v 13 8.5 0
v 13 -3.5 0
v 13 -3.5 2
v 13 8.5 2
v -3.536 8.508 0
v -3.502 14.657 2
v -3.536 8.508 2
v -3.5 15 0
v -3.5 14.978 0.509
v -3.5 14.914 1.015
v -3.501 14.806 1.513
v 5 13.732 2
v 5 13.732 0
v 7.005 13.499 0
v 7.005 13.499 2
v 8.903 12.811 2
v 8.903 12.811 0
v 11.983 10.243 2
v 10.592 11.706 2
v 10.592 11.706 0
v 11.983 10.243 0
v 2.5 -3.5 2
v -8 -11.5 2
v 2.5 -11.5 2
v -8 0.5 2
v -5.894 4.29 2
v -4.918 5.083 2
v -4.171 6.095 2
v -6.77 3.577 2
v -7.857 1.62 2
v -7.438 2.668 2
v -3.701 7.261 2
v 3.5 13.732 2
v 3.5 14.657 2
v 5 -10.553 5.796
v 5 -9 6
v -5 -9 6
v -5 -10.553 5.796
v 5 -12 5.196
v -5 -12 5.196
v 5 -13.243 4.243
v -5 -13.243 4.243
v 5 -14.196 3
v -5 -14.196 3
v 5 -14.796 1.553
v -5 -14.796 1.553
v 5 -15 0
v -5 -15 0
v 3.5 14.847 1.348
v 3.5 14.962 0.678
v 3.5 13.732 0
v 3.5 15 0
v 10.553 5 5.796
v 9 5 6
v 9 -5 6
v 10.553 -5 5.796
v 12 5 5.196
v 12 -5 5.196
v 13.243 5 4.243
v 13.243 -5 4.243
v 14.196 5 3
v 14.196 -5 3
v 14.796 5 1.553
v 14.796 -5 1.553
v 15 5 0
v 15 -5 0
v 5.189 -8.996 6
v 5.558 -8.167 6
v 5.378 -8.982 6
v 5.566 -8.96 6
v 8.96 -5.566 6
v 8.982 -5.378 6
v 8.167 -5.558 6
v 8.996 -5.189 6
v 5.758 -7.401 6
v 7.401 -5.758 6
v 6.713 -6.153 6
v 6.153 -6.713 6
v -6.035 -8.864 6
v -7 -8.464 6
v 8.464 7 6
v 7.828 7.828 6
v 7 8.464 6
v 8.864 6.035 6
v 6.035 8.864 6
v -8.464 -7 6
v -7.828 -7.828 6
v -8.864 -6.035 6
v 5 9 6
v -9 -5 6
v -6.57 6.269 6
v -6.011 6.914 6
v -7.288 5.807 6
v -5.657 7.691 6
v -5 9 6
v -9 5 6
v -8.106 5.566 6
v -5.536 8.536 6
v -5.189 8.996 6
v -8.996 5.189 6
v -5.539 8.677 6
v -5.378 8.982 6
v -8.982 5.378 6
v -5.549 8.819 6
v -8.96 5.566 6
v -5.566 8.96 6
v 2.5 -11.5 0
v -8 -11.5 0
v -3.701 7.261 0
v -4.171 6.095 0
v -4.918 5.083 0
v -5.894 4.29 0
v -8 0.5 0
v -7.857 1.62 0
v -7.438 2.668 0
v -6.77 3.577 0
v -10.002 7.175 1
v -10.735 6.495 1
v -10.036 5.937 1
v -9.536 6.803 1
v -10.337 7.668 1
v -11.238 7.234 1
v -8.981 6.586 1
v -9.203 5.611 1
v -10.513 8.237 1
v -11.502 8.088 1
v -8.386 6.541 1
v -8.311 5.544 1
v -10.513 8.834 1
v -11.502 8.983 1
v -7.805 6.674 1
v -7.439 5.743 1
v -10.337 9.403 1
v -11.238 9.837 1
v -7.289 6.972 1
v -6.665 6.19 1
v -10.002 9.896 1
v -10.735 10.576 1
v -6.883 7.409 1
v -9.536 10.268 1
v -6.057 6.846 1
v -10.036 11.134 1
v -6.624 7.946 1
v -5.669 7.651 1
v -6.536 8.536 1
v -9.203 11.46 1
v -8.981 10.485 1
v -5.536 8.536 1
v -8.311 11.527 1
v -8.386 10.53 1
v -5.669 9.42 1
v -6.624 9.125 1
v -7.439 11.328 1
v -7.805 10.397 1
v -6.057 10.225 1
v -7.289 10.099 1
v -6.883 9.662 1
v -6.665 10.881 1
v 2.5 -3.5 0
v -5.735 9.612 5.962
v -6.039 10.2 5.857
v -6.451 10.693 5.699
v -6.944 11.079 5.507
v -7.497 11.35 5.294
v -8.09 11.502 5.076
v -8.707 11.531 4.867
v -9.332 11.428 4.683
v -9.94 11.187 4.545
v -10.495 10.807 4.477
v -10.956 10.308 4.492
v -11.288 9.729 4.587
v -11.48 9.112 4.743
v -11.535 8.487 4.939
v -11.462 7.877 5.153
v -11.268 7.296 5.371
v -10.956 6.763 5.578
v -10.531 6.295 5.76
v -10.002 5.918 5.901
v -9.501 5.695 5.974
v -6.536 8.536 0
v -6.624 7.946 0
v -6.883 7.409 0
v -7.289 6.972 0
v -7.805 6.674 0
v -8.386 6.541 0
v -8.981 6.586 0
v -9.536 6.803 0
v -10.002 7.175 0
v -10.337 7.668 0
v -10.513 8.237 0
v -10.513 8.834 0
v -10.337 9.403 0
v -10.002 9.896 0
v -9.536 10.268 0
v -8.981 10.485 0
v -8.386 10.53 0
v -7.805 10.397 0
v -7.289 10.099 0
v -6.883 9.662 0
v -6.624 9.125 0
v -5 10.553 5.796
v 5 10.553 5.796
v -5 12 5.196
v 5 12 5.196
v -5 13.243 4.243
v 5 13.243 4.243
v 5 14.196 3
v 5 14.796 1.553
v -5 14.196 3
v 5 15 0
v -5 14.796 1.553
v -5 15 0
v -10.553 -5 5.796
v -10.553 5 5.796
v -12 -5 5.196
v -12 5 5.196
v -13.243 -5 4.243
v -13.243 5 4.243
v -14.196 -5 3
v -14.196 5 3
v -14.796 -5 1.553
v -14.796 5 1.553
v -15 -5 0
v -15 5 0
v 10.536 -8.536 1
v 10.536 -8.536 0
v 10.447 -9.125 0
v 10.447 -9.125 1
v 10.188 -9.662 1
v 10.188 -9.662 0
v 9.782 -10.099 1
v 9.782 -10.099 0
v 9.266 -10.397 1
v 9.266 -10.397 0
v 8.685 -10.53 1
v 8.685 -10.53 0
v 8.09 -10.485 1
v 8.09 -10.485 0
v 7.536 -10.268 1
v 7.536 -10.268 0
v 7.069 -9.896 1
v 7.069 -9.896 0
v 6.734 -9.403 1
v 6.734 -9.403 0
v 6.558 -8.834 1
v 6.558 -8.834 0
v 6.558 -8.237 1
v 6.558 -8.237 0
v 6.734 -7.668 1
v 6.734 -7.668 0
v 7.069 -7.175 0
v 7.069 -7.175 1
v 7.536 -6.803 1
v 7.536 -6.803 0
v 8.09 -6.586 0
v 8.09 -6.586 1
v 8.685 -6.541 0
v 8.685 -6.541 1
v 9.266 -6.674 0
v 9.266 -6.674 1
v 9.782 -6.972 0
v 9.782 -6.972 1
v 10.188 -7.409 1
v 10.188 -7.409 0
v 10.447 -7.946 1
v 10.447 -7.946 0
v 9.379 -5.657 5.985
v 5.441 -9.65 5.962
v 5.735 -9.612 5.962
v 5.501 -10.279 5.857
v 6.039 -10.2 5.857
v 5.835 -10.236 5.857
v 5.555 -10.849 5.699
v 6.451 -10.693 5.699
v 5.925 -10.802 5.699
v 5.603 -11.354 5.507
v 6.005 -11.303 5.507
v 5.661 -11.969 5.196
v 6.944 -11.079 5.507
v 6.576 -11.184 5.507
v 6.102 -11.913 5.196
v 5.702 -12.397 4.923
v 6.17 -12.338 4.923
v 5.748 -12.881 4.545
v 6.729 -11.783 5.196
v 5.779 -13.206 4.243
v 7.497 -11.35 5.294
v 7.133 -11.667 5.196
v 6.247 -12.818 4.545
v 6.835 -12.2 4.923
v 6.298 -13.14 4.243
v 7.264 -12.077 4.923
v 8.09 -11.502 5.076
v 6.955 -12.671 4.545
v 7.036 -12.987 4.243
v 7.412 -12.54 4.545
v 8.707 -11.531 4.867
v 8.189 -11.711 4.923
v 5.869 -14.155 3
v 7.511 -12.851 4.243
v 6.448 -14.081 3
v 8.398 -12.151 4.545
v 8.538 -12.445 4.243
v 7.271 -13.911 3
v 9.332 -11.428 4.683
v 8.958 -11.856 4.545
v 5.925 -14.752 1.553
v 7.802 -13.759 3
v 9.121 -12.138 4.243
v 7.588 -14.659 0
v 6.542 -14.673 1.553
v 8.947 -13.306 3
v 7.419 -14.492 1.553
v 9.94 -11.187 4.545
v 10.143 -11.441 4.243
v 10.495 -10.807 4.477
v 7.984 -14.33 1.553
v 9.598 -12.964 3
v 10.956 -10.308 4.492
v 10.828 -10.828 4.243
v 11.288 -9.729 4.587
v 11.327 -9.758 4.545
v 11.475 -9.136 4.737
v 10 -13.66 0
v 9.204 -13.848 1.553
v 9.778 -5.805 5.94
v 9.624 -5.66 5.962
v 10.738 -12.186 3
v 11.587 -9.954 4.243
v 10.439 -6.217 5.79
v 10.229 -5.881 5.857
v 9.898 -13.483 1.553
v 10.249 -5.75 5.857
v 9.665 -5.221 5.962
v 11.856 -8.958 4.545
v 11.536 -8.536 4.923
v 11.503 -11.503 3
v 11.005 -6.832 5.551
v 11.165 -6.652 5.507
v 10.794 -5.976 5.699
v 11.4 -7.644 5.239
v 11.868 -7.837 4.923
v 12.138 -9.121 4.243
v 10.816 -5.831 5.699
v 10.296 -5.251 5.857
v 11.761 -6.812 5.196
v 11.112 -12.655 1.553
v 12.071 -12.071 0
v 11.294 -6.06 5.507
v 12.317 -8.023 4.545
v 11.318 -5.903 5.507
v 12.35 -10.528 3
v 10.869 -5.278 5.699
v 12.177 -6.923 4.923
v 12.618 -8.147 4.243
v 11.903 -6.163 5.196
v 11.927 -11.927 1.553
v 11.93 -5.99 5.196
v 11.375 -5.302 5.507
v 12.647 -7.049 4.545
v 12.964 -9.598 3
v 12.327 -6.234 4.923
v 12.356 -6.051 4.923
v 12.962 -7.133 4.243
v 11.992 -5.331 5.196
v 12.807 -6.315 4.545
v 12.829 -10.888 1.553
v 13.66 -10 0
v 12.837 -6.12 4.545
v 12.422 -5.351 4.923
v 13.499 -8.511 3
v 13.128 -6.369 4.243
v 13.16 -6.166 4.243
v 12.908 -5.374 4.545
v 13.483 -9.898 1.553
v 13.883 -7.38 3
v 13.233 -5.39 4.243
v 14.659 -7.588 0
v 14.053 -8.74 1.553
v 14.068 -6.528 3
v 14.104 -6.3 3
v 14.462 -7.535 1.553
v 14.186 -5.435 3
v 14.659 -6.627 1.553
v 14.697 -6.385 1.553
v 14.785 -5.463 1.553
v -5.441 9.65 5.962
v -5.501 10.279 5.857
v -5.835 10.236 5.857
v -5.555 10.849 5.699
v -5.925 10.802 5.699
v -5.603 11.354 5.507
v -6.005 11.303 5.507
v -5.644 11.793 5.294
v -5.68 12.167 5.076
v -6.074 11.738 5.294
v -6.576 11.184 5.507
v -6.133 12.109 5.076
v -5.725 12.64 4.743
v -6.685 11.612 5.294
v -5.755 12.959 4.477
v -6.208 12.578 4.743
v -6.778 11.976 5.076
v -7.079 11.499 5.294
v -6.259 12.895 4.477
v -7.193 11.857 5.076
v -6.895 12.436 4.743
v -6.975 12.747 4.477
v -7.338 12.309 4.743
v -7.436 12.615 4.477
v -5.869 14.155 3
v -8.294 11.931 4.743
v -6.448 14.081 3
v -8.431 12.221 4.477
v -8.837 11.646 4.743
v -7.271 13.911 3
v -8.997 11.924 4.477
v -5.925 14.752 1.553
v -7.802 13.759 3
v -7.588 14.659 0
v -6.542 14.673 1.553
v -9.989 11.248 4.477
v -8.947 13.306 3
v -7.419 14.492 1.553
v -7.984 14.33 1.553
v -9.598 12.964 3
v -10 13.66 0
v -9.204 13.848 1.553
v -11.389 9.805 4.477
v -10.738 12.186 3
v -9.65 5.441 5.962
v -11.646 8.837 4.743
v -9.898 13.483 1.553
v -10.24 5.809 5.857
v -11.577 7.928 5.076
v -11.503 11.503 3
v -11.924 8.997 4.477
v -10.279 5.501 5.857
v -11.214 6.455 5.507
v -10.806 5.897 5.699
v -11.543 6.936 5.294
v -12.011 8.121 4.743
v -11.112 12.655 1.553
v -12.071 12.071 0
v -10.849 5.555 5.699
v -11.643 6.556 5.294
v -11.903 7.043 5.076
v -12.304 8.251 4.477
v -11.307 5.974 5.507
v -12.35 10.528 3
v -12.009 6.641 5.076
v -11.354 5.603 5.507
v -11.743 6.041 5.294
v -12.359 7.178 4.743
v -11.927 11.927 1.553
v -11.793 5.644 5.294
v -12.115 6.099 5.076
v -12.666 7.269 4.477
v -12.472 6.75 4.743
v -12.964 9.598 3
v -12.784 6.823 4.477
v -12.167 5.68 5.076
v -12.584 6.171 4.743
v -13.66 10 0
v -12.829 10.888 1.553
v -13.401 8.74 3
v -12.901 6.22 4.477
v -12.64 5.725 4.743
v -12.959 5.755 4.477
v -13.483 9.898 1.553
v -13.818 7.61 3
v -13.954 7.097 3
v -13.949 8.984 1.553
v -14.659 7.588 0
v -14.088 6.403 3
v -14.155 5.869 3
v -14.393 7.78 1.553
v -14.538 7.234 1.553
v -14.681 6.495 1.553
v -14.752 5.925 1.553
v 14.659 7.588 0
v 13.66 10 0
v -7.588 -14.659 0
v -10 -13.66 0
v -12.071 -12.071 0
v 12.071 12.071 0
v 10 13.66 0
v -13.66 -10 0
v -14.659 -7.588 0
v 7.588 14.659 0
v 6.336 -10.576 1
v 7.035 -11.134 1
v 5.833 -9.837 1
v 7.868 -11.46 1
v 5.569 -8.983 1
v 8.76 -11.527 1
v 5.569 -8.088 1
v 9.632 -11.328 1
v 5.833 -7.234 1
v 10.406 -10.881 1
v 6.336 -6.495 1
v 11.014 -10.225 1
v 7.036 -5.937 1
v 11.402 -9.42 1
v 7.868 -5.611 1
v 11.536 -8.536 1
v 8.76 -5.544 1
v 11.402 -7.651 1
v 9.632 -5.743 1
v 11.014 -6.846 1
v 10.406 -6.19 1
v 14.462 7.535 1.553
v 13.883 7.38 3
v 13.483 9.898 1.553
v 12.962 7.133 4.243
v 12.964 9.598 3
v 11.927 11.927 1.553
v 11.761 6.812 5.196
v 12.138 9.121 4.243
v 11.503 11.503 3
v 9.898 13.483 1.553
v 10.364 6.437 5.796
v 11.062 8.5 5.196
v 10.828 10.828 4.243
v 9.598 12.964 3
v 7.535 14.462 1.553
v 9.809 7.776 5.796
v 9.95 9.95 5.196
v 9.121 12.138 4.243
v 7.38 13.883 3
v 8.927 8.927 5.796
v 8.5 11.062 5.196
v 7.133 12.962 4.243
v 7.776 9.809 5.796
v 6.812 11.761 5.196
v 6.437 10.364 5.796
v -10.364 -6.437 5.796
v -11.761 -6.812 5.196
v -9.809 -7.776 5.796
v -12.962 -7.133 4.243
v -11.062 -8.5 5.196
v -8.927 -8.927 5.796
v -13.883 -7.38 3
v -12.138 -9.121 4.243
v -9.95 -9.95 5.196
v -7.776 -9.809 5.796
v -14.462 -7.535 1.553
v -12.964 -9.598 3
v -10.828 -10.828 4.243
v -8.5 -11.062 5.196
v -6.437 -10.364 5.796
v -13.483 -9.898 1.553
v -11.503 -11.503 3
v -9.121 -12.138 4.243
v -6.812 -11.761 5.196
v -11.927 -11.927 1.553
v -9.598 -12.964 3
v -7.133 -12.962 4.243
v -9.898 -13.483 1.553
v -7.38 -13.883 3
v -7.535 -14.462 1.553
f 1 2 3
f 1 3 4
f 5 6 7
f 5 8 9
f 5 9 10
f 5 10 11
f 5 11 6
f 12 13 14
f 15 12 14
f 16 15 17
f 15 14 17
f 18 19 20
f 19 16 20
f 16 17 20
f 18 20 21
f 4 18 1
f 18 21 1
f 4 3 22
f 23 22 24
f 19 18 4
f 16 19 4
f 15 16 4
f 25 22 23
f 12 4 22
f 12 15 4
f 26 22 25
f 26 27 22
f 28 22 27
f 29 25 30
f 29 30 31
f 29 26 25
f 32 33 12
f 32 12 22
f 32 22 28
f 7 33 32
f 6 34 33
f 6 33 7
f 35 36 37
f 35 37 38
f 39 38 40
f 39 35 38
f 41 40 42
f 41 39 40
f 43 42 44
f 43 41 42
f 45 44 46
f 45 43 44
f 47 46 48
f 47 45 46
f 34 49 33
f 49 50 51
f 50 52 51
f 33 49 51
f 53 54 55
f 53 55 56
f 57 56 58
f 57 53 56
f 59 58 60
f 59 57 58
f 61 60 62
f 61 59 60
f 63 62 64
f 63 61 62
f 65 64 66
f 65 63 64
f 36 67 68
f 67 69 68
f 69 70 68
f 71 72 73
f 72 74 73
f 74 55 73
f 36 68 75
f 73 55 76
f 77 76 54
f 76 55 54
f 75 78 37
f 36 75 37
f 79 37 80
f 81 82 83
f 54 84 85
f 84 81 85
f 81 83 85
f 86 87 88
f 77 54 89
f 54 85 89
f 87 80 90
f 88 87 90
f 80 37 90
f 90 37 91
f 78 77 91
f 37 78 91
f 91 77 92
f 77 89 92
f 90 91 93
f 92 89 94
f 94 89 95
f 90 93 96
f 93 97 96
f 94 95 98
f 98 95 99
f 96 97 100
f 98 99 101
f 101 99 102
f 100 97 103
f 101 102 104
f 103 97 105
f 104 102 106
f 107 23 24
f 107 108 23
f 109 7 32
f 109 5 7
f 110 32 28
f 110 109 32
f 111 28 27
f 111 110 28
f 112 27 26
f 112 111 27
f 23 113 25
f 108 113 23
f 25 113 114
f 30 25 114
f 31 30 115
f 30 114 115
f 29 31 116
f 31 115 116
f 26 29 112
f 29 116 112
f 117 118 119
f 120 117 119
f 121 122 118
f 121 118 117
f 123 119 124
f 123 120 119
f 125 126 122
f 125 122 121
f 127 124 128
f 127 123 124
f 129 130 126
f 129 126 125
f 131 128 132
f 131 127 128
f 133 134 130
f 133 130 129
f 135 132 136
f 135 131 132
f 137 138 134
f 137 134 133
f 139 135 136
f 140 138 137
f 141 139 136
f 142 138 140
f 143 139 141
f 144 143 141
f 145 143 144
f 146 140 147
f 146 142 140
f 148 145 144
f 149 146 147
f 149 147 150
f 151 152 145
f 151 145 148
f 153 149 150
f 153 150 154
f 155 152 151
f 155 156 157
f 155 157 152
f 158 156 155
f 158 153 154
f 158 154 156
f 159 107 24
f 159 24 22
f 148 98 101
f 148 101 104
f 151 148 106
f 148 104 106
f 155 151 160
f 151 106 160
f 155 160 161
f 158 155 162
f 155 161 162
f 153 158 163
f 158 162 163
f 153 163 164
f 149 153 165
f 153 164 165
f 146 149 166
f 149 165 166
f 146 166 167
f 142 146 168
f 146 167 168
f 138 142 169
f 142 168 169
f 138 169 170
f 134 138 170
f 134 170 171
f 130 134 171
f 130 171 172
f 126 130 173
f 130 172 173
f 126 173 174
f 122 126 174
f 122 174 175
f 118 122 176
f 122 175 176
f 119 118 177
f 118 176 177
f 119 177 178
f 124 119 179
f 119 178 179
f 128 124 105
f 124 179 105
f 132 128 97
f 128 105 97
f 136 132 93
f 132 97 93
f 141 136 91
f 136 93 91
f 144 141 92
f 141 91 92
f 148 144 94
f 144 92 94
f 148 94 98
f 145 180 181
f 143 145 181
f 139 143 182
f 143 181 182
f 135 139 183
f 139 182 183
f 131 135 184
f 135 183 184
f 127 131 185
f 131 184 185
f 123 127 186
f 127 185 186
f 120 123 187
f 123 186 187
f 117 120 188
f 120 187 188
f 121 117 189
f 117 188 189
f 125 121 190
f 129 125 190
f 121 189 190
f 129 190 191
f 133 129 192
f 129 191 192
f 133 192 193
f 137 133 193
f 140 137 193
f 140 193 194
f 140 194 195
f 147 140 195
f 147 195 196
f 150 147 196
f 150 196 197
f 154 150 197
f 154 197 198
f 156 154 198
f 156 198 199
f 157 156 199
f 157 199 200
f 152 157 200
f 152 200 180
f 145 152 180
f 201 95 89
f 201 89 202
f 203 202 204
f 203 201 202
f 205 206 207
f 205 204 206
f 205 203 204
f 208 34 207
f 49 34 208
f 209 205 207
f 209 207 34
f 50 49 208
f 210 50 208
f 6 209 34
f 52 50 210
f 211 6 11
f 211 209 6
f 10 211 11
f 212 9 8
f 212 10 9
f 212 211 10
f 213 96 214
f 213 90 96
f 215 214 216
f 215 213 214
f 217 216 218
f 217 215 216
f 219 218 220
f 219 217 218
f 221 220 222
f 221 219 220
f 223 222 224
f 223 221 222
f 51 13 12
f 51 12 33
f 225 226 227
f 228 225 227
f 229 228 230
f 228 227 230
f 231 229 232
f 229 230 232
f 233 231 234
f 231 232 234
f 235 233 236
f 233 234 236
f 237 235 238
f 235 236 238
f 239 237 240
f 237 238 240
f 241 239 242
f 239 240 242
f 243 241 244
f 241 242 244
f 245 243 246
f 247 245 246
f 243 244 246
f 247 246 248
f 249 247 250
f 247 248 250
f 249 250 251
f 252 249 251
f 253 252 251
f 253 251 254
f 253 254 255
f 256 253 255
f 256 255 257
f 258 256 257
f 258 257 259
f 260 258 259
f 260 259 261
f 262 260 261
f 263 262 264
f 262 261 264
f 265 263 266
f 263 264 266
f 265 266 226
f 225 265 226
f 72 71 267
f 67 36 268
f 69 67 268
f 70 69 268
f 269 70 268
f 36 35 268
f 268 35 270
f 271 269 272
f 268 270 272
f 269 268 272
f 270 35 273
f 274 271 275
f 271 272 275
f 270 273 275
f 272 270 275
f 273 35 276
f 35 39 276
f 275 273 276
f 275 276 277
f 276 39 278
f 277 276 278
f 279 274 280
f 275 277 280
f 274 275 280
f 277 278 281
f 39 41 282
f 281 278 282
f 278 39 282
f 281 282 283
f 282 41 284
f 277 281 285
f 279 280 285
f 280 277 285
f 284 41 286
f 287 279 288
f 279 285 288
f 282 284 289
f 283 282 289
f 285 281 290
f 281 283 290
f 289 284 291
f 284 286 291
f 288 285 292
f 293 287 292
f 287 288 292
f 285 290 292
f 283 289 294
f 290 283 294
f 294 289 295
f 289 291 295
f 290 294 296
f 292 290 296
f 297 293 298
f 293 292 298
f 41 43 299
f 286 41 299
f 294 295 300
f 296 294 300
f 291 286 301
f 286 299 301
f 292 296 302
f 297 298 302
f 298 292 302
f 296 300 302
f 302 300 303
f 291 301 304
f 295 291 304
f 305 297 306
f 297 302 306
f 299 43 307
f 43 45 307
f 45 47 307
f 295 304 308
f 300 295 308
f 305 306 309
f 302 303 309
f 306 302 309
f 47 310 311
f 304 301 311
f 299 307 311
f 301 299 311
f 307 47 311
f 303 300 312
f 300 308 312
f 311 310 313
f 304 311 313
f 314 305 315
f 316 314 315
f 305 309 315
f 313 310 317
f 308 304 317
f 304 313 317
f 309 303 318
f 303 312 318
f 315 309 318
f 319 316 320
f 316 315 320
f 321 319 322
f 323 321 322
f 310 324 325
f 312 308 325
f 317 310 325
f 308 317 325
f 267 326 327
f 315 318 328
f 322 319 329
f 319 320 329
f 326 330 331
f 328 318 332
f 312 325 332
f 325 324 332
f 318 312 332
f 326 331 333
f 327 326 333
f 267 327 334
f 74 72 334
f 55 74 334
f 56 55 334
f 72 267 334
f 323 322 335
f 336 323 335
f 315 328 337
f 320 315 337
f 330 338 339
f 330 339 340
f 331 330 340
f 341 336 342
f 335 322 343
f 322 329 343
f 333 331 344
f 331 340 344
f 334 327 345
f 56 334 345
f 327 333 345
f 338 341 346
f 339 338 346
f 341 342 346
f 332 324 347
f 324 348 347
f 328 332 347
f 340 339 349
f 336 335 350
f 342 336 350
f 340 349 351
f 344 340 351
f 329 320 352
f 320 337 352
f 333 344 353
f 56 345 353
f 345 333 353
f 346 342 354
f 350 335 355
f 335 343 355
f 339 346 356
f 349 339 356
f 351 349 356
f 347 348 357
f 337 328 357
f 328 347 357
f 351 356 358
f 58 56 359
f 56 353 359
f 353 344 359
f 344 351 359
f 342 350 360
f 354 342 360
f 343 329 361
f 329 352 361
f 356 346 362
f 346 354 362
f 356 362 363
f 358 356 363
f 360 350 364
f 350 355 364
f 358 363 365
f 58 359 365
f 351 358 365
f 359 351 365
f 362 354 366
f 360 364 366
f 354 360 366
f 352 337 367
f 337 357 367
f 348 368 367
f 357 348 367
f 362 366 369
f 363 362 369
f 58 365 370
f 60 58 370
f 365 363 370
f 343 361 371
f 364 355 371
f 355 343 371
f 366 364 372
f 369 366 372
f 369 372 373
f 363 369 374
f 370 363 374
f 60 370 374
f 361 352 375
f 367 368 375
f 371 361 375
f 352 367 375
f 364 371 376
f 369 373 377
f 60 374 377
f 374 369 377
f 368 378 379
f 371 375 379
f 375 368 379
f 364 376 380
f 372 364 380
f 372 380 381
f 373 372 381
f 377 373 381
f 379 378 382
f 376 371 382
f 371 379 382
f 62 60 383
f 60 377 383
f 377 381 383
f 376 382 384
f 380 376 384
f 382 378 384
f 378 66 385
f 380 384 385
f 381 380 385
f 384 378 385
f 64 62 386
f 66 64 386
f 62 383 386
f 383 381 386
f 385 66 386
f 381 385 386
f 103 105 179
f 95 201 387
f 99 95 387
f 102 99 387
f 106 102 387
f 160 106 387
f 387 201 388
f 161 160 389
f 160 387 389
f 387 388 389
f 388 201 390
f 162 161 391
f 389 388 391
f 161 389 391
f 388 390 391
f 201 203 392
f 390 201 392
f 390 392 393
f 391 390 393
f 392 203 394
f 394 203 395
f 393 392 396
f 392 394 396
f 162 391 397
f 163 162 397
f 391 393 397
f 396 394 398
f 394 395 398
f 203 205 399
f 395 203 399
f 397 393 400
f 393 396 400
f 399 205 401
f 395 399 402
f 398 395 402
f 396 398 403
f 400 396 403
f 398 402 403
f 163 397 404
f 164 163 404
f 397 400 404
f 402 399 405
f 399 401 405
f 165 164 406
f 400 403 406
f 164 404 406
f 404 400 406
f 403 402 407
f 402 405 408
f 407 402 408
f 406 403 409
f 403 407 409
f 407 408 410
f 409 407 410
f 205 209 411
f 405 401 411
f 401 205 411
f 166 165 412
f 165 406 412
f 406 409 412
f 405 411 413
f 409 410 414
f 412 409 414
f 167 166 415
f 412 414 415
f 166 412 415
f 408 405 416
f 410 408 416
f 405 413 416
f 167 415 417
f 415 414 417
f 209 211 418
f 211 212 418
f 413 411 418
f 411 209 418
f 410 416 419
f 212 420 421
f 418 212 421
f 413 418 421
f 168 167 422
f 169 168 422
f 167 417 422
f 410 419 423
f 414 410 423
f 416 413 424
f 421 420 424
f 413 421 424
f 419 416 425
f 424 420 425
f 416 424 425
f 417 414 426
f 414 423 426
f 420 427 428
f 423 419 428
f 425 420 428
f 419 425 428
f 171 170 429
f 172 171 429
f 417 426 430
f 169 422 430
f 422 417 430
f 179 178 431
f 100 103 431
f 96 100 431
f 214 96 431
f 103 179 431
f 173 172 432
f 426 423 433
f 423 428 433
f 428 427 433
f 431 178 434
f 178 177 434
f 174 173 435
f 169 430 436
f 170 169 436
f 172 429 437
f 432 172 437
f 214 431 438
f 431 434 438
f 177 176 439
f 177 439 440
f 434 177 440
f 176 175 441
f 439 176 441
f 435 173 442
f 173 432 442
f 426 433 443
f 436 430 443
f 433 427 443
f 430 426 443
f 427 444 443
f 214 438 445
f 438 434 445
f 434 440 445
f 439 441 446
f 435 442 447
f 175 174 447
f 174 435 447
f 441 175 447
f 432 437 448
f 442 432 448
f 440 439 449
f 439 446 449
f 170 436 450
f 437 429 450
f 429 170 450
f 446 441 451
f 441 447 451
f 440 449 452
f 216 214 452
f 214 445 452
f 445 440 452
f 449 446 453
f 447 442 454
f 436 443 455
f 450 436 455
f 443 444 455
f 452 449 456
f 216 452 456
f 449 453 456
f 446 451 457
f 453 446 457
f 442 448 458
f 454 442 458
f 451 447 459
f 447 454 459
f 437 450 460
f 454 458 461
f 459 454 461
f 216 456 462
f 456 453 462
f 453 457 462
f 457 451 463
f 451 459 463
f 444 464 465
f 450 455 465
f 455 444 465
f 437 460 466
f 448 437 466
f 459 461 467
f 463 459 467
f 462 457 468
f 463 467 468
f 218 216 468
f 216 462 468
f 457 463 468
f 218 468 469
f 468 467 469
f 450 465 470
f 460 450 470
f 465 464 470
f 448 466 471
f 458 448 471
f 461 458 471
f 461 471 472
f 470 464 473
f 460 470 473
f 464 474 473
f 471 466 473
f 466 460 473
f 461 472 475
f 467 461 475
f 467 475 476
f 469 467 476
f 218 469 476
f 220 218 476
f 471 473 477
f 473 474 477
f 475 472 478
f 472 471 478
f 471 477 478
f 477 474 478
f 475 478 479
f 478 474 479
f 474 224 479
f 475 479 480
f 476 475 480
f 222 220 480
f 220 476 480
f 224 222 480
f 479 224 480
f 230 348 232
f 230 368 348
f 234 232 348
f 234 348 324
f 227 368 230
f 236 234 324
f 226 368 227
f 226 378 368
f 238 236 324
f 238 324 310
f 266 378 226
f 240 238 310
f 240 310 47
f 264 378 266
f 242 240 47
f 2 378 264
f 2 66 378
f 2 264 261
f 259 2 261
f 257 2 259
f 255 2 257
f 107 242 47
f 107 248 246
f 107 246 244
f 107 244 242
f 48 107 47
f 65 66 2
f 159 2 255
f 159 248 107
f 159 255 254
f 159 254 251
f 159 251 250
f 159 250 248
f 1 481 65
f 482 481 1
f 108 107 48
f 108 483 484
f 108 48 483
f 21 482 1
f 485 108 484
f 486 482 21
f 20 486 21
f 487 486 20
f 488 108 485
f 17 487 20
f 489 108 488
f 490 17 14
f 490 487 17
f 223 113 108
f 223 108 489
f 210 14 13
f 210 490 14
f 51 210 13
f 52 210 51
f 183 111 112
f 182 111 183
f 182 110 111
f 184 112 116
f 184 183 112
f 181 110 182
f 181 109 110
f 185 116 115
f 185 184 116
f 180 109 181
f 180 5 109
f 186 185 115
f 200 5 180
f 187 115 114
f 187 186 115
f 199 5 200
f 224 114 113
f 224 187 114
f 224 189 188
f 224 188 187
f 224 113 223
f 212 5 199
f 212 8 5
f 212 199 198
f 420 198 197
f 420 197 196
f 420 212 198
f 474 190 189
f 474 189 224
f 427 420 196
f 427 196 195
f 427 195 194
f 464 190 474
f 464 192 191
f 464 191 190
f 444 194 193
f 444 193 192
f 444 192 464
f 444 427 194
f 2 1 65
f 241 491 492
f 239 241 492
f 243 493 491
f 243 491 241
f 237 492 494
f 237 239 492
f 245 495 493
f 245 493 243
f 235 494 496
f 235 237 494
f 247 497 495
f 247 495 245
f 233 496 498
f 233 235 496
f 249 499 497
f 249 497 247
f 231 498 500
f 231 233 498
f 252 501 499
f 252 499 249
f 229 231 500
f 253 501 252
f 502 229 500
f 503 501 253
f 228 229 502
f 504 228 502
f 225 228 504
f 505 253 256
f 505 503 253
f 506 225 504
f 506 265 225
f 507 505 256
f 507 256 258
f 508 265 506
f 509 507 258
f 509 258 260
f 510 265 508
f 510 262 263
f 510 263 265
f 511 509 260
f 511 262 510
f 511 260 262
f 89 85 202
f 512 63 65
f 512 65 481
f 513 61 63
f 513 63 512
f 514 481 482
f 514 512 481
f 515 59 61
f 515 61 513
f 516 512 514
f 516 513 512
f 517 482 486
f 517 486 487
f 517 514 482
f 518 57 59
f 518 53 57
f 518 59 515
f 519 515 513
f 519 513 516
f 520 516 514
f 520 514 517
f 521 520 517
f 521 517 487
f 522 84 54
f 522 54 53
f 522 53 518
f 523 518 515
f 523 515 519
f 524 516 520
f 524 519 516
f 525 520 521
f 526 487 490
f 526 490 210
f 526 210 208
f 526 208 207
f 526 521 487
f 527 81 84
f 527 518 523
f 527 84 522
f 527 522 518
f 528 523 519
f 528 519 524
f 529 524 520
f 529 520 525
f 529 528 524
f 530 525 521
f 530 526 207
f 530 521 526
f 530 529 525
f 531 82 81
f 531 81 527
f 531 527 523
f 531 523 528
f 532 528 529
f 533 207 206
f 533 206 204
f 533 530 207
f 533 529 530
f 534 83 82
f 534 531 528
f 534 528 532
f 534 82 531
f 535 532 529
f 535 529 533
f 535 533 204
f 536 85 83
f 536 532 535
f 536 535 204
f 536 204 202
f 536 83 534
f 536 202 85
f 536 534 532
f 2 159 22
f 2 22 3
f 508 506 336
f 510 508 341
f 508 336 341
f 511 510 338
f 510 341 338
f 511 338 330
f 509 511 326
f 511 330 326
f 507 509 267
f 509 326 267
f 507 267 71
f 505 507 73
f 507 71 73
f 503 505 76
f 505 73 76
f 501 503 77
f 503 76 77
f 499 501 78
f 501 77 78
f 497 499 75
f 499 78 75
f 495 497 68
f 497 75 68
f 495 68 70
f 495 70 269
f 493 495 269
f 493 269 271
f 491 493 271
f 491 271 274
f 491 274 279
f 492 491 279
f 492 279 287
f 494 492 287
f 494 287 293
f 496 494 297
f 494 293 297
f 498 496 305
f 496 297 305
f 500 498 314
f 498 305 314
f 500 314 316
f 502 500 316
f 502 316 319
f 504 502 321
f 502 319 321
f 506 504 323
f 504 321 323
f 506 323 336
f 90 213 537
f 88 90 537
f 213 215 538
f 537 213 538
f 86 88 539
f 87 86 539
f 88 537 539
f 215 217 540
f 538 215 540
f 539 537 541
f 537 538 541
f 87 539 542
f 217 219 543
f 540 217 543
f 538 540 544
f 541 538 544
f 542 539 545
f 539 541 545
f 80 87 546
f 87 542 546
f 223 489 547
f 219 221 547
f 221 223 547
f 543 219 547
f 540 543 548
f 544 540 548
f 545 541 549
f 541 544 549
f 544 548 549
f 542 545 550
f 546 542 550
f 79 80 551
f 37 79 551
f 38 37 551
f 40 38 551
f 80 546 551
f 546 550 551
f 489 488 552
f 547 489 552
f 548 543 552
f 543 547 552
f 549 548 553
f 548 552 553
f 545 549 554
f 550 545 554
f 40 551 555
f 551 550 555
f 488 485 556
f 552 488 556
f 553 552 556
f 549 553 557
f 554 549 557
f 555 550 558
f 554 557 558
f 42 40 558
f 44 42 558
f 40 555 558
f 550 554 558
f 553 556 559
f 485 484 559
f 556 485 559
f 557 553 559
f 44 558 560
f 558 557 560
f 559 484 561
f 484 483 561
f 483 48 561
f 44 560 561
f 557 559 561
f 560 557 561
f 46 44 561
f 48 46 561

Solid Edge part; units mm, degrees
sketch "Sketch1" plane through (0, 0, 0) normal (0, 0, 1) x (1, 0, 0)
  line L0 (-5, 15) -> (5, 15)
  arc A0 (15, 5) -> (5, 15) centre (5, 5) ccw
  line L1 (15, 5) -> (15, -5)
  arc A1 (5, -15) -> (15, -5) centre (5, -5) ccw
  line L2 (5, -15) -> (-5, -15)
  arc A2 (-15, -5) -> (-5, -15) centre (-5, -5) ccw
  line L3 (-15, -5) -> (-15, 5)
  arc A3 (-5, 15) -> (-15, 5) centre (-5, 5) ccw
extrude "Protrusion1" add sketch "Sketch1" along normal blind 6
sketch "Sketch2" plane through (0, 0, 0) normal (0, 0, -1) x (-1, 0, 0)
  arc A0 (8, 0.5) -> (5.8943, 4.2901) centre (3.5362, 0.5) ccw
  line L0 (3.5, 15) -> (3.5356, 8.5081)
  line L1 (-3.5, 15) -> (3.5, 15)
  line L2 (-3.5, 15) -> (-3.5, 13.7321)
  line L3 (-5, 13.7321) -> (-3.5, 13.7321)
  arc A1 (-13, 8.5) -> (-5, 13.7321) centre (-5, 5) cw
  line L4 (-13, -3.5) -> (-13, 8.5)
  line L5 (-2.5, -3.5) -> (-13, -3.5)
  line L6 (-2.5, -11.5) -> (-2.5, -3.5)
  line L7 (8, -11.5) -> (-2.5, -11.5)
  line L8 (8, 0.5) -> (8, -11.5)
  arc A2 (5.8943, 4.29) -> (3.5356, 8.5081) centre (8.5355, 8.5355) cw
extrude "VaciadoExtruido_1" cut sketch "Sketch2" against normal blind 2
fillet "Redondeo_2" radius 6 7 edges at (-12.0711, -12.0711, 6) (-12.0711, 12.0711, 6) (0, 15, 6) (12.0711, 12.0711, 6) (12.0711, -12.0711, 6) (15, 0, 6) (0, -15, 6)
sketch "Sketch3" plane through (0, 0, 0) normal (0, 0, 1) x (1, 0, 0)
  circle A0 centre (-8.5355, 8.5355) radius 2
  circle A1 centre (8.5355, -8.5355) radius 2
extrude "Cutout1" cut sketch "Sketch3" along normal through all
sketch "Sketch4" plane through (0, 0, 6) normal (0, 0, 1) x (1, 0, 0)
  circle A0 centre (-8.5355, 8.5355) radius 3
  circle A1 centre (8.5355, -8.5355) radius 3
extrude "VaciadoExtruido_3" cut sketch "Sketch4" against normal blind 5
